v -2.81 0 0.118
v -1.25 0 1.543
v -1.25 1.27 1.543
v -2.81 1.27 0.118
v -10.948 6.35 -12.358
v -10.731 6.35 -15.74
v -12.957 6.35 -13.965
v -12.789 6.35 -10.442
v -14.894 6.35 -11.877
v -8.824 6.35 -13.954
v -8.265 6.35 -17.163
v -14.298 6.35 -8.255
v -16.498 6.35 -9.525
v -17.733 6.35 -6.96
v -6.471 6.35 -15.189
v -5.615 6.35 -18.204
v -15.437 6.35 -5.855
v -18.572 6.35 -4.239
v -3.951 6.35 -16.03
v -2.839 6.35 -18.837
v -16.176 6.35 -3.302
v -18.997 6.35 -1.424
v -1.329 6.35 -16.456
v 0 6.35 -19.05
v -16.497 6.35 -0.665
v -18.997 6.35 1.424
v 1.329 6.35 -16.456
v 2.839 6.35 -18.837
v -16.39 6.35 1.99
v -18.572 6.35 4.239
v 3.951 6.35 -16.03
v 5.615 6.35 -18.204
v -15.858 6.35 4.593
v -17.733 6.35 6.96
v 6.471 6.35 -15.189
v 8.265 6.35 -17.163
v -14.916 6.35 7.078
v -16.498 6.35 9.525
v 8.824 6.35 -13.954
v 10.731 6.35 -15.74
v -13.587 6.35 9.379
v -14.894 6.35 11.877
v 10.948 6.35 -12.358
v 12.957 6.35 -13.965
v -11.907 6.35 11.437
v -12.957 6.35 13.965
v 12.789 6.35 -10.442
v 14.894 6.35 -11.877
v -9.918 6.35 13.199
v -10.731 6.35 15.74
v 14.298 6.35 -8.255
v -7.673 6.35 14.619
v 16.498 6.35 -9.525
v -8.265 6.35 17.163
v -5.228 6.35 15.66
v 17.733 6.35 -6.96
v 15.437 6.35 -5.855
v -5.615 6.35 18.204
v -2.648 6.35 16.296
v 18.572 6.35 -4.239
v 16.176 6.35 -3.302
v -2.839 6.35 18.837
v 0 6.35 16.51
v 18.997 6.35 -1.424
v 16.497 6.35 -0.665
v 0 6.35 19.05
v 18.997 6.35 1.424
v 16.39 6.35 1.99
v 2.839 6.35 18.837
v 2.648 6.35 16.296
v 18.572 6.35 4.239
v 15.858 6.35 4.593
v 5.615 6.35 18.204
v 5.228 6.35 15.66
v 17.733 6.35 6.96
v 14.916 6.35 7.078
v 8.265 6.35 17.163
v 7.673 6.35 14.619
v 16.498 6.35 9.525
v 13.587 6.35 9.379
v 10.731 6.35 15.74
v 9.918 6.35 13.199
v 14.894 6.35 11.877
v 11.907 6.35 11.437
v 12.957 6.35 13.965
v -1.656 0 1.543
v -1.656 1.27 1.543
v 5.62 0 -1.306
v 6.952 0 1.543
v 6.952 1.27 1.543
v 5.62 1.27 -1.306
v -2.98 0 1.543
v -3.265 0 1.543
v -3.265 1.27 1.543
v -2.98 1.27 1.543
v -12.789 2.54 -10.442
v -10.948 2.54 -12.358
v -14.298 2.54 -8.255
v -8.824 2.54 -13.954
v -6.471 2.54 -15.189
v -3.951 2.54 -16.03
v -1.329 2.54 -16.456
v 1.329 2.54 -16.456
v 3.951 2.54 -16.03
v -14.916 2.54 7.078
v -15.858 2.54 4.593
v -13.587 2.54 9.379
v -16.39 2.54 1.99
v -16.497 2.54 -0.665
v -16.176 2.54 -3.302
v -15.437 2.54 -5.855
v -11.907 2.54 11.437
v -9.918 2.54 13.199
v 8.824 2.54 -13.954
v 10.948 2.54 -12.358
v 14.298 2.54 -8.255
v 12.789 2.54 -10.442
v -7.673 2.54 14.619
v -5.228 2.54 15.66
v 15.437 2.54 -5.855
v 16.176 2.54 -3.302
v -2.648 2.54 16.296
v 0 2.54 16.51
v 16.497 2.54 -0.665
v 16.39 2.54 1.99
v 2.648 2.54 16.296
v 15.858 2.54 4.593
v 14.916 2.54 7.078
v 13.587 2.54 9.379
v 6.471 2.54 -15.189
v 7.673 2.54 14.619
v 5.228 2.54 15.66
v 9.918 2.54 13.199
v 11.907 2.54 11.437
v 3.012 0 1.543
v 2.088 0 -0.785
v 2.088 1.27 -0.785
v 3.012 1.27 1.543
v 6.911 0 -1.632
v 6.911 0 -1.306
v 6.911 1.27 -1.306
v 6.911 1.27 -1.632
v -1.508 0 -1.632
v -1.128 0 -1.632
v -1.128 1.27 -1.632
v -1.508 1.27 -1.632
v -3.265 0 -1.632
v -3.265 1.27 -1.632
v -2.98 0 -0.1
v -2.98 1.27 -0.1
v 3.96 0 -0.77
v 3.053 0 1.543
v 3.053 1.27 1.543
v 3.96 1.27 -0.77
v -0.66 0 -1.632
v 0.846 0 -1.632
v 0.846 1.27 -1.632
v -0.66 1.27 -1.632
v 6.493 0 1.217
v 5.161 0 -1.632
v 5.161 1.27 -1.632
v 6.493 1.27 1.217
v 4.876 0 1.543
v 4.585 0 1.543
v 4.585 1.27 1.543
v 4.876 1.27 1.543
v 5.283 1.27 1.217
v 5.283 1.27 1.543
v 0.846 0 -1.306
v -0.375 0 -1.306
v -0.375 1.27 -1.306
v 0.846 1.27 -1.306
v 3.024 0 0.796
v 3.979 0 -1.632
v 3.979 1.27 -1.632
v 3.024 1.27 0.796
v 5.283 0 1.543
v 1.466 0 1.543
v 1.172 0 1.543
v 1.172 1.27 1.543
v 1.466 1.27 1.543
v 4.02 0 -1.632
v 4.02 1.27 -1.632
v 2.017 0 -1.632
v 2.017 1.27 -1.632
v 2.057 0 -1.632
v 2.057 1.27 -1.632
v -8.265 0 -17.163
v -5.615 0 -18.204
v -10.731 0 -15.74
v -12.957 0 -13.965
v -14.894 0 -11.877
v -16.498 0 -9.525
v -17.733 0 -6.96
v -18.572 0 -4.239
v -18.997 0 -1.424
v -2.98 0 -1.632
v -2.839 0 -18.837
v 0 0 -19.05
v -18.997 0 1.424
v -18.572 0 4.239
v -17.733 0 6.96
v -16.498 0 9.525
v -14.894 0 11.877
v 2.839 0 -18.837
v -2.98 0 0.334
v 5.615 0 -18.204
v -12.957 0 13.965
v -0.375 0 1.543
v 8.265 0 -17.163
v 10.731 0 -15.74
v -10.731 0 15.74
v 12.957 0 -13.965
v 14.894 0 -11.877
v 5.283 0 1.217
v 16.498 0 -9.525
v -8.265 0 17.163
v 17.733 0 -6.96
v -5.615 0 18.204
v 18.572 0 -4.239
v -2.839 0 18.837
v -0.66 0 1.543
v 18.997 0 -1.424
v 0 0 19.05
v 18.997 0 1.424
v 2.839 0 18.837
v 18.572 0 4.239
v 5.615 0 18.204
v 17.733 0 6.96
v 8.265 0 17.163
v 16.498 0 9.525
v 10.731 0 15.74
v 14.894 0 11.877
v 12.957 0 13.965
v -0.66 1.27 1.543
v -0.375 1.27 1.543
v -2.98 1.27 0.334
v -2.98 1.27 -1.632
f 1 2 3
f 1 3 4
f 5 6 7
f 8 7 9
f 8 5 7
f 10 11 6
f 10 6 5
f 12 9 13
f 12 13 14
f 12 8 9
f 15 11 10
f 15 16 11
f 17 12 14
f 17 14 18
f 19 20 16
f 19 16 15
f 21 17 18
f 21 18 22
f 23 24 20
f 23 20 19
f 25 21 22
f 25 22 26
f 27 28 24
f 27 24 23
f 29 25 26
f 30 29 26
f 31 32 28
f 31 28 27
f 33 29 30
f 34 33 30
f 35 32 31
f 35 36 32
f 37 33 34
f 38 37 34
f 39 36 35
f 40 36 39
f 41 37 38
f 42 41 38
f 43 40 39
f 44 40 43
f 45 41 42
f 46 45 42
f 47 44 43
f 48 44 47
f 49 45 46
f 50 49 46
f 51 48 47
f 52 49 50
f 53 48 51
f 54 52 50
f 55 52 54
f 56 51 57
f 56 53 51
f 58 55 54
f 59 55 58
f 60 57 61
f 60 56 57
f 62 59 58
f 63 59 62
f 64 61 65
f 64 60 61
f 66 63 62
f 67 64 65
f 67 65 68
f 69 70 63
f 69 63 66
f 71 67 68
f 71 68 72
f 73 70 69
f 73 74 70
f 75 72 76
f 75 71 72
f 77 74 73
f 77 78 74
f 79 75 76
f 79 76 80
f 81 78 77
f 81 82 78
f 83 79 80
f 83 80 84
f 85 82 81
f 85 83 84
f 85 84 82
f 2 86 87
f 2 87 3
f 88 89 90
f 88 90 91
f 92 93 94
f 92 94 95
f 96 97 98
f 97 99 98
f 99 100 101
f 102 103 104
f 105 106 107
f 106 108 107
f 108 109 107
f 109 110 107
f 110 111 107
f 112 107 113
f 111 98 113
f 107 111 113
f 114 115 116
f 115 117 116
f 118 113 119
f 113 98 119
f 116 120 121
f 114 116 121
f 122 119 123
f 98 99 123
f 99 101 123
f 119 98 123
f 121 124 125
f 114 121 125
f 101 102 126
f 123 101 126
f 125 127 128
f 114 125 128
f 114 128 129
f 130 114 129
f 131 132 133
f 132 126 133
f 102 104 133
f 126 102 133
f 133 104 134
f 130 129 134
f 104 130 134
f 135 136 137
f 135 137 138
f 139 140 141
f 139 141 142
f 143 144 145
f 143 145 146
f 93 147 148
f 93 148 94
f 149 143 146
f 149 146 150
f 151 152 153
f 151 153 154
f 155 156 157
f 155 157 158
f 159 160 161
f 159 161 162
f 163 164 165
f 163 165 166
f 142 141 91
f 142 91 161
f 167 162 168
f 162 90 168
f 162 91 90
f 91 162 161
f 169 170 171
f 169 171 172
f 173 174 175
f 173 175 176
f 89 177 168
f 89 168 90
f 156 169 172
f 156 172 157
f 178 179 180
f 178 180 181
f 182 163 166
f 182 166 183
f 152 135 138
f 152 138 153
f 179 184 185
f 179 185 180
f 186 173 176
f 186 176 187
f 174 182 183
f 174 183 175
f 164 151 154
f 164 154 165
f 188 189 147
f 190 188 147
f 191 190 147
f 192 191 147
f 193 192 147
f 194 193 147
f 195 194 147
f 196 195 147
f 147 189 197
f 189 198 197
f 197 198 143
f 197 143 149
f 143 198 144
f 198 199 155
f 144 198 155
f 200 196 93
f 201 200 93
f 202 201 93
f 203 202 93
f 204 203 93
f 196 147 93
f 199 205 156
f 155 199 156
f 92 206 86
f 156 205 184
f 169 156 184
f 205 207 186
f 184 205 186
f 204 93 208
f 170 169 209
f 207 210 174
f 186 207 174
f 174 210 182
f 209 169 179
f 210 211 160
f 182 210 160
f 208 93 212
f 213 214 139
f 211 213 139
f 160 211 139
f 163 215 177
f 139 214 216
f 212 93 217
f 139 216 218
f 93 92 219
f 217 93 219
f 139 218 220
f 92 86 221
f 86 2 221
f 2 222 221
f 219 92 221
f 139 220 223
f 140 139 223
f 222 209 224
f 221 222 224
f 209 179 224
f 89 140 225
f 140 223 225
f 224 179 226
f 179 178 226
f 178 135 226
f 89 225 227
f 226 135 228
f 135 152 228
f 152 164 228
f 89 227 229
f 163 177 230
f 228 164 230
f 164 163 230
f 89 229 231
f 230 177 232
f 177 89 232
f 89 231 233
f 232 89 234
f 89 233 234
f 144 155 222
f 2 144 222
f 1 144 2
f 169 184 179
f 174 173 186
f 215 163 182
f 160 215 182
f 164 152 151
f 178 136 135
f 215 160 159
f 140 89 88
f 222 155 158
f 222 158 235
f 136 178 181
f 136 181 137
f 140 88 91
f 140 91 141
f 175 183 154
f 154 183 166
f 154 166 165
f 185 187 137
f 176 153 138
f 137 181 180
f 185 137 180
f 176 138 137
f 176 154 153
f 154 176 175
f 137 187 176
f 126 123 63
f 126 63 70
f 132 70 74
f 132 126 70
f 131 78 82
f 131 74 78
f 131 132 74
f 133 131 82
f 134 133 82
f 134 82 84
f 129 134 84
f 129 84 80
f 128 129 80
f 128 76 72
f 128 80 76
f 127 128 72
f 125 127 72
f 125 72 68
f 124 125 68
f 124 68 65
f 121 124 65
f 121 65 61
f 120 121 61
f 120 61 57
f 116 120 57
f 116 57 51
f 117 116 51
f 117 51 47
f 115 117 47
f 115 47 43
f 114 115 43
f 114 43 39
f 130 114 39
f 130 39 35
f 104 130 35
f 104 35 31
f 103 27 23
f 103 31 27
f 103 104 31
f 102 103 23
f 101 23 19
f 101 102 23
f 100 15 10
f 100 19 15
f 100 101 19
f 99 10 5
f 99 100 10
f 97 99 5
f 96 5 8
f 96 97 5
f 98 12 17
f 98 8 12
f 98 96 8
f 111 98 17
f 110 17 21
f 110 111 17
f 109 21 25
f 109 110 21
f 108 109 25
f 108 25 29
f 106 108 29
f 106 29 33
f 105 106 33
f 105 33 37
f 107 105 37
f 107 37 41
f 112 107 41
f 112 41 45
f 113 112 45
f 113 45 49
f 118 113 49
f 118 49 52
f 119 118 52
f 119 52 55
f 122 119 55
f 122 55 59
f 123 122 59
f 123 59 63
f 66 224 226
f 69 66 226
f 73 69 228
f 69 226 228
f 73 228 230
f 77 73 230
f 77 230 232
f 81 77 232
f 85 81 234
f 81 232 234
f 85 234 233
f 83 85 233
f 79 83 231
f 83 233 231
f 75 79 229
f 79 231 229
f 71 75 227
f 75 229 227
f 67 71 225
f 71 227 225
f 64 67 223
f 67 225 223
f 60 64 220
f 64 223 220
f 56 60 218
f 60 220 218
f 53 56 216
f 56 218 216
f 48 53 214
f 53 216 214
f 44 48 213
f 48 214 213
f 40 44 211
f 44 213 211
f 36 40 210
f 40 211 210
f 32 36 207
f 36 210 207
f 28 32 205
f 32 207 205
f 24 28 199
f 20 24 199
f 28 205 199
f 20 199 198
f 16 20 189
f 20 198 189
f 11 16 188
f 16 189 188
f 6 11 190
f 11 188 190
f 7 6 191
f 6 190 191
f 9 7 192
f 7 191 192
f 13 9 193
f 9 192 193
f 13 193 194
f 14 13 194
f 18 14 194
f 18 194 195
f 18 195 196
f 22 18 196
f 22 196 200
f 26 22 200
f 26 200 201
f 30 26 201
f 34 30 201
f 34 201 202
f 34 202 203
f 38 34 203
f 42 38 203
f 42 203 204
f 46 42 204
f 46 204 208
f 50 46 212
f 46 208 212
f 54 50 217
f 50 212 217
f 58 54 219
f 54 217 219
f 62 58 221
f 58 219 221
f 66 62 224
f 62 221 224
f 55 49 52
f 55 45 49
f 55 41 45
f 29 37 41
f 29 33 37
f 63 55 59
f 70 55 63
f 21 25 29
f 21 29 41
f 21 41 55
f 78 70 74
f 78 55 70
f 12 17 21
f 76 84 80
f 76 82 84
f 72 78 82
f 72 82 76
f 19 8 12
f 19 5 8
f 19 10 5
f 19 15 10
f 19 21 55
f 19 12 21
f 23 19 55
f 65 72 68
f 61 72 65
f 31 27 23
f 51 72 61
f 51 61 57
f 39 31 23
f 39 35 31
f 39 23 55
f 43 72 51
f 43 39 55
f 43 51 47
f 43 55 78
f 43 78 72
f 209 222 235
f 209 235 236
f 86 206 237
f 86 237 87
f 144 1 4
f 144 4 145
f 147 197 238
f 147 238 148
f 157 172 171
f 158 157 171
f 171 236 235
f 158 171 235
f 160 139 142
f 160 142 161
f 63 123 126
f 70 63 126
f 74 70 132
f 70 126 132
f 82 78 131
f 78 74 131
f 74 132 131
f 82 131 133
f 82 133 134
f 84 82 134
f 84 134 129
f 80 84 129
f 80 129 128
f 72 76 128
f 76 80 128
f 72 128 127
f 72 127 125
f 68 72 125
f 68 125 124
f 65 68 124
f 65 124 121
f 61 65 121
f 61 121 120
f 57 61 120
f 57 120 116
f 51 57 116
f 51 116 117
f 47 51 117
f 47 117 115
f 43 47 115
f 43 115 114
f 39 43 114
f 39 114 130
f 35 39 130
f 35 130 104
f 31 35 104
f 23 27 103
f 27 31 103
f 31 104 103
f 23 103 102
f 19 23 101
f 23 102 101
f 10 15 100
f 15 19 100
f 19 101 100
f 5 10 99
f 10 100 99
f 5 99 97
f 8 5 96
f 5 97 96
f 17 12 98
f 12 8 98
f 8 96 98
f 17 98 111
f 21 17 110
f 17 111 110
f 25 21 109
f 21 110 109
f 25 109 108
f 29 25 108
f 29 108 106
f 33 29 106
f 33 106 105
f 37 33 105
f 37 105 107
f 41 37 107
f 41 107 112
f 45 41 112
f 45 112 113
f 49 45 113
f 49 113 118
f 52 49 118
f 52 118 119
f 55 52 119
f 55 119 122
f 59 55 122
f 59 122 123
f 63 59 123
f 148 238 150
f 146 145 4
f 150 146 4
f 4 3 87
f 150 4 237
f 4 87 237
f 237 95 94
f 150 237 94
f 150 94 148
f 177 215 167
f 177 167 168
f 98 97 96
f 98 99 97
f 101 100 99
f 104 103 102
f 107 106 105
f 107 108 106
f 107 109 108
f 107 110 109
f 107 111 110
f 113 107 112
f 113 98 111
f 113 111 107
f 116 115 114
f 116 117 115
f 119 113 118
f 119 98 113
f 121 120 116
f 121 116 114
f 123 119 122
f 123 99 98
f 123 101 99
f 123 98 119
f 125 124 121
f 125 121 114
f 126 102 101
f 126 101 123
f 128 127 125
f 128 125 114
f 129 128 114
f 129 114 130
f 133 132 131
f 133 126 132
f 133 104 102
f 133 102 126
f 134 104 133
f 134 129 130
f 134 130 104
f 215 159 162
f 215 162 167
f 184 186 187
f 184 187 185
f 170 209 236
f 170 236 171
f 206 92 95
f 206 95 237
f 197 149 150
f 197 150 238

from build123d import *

# Parameters (mm, degrees)
SKETCH1_R           = 19.05
BOSS_EXTRUDE1_DEPTH = 6.35
SHELL1_T            = -2.54
BOSS_EXTRUDE3_REACH = 29.679
SKETCH35_R          = 44.45
CUT_EXTRUDE4_DEPTH  = 1.27


with BuildPart() as part:
    # Sketch1 → Boss-Extrude1 (new body)
    with BuildSketch(Plane(origin=(0, 0, 0), x_dir=(1, 0, 0), z_dir=(0, 1, 0))):
        with Locations(Location((0, 0, 0), (0, 0, 270))):
            Circle(SKETCH1_R)
    extrude(amount=BOSS_EXTRUDE1_DEPTH)

    # Shell1
    shell1_openings = [part.faces().sort_by_distance(p)[0] for p in [
        (0, 6.35, 0),
    ]]
    offset(amount=SHELL1_T, openings=shell1_openings, kind=Kind.INTERSECTION)


with BuildPart() as body_2:

    # Sketch35 → Boss-Extrude3 (new, up to next)
    with BuildSketch(Plane(origin=(0, 6.35, 0), x_dir=(1, 0, 0), z_dir=(0, 1, 0)), mode=Mode.PRIVATE) as boss_extrude3_sk1:
        Circle(SKETCH35_R)
    boss_extrude3_tool1 = extrude(boss_extrude3_sk1.sketch, amount=-BOSS_EXTRUDE3_REACH, mode=Mode.PRIVATE) - part.part
    add(boss_extrude3_tool1.solids().sort_by_distance((0, 6.35, 0))[0])


with BuildPart() as part_1:
    add(part.part)

    # Sketch36 → Cut-Extrude4 (cut)
    with BuildSketch(Plane.XZ):
        Polygon((-3.264836953, 1.543049673), (-2.979901056, 1.543049673), (-2.979901056, 0.333980162), (-1.656348371, 1.543049673), (-1.249933107, 1.543049673), (-2.810084349, 0.118370186), (-1.127817722, -1.631950327), (-1.507520246, -1.631950327), (-2.979901056, -0.09978386), (-2.979901056, -1.631950327), (-3.264836953, -1.631950327), align=None)
        Polygon((-0.659708748, 1.543049673), (-0.37477285, 1.543049673), (-0.37477285, -1.306309301), (0.846380996, -1.306309301), (0.846380996, -1.631950327), (-0.659708748, -1.631950327), align=None)
        Polygon((1.172022021, 1.543049673), (1.466498183, 1.543049673), (2.087887406, -0.785410864), (3.01202102, 1.543049673), (3.053362166, 1.543049673), (3.960323303, -0.769510423), (4.584892614, 1.543049673), (4.876188688, 1.543049673), (4.02010896, -1.631950327), (3.979403832, -1.631950327), (3.024105355, 0.796364978), (2.05735856, -1.631950327), (2.016653432, -1.631950327), align=None)
        Polygon((5.28323997, 1.217408648), (5.28323997, 1.543049673), (6.952150226, 1.543049673), (5.620329313, -1.306309301), (6.911445098, -1.306309301), (6.911445098, -1.631950327), (5.161124585, -1.631950327), (6.492945499, 1.217408648), align=None)
    extrude(amount=-CUT_EXTRUDE4_DEPTH, mode=Mode.SUBTRACT)


solid = Compound([body_2.part, part_1.part])
